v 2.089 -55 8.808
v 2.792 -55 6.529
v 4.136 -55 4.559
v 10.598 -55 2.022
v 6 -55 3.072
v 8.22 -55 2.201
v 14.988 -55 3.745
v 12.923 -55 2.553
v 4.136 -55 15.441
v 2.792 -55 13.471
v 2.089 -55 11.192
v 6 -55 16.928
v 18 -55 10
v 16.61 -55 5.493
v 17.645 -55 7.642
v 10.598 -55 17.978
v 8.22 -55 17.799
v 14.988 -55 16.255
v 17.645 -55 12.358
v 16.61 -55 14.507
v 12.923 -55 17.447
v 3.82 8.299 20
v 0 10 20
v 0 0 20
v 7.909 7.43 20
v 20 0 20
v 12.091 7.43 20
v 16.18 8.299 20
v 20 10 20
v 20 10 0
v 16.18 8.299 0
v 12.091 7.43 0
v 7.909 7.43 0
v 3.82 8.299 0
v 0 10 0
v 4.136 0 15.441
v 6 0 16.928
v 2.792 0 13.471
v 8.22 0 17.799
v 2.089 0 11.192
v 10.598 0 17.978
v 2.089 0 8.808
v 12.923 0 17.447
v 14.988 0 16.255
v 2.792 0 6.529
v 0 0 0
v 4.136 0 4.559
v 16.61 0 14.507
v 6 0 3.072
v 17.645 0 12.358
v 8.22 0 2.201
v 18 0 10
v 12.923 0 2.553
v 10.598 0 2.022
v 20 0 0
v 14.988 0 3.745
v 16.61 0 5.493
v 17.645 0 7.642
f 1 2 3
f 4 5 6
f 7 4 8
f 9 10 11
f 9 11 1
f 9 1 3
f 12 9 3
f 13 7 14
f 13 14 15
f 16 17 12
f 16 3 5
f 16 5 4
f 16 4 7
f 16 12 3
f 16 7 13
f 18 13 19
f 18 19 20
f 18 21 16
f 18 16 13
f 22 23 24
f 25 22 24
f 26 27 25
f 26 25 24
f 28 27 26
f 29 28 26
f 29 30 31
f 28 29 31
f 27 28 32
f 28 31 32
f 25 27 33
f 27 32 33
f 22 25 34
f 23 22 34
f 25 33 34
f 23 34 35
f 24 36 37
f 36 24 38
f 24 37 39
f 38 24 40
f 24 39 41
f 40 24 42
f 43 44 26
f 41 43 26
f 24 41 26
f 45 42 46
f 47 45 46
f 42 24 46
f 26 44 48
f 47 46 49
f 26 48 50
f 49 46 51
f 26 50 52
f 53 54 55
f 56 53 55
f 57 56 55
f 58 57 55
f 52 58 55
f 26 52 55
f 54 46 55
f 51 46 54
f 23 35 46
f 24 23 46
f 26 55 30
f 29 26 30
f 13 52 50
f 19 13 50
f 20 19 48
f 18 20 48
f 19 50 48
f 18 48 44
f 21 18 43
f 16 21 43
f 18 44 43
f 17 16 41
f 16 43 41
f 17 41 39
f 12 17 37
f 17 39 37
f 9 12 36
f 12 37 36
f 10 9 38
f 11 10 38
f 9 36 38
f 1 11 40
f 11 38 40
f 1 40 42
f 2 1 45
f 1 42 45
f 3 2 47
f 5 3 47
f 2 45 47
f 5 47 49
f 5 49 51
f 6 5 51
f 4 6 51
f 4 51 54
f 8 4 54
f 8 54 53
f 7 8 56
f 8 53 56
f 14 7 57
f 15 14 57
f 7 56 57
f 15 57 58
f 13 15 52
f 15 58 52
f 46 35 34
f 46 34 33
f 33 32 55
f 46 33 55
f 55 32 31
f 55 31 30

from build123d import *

# Parameters (mm, degrees)
BOSS_EXTRUDE1_DEPTH = 20
SKETCH2_R           = 8
BOSS_EXTRUDE2_DEPTH = 55


with BuildPart() as part:
    # Sketch1 → Boss-Extrude1 (new body)
    with BuildSketch(Plane.XY):
        with BuildLine():
            Line((0, 10), (0, 0))
            Line((0, 0), (20, 0))
            Line((20, 0), (20, 10))
            ThreePointArc((20, 10), (10, 7.320508076), (0, 10))
        make_face()
    extrude(amount=BOSS_EXTRUDE1_DEPTH)

    # Sketch2 → Boss-Extrude2 (add)
    with BuildSketch(Plane.XZ):
        with Locations((10, 10)):
            Circle(SKETCH2_R)
    extrude(amount=BOSS_EXTRUDE2_DEPTH)


solid = part.part
